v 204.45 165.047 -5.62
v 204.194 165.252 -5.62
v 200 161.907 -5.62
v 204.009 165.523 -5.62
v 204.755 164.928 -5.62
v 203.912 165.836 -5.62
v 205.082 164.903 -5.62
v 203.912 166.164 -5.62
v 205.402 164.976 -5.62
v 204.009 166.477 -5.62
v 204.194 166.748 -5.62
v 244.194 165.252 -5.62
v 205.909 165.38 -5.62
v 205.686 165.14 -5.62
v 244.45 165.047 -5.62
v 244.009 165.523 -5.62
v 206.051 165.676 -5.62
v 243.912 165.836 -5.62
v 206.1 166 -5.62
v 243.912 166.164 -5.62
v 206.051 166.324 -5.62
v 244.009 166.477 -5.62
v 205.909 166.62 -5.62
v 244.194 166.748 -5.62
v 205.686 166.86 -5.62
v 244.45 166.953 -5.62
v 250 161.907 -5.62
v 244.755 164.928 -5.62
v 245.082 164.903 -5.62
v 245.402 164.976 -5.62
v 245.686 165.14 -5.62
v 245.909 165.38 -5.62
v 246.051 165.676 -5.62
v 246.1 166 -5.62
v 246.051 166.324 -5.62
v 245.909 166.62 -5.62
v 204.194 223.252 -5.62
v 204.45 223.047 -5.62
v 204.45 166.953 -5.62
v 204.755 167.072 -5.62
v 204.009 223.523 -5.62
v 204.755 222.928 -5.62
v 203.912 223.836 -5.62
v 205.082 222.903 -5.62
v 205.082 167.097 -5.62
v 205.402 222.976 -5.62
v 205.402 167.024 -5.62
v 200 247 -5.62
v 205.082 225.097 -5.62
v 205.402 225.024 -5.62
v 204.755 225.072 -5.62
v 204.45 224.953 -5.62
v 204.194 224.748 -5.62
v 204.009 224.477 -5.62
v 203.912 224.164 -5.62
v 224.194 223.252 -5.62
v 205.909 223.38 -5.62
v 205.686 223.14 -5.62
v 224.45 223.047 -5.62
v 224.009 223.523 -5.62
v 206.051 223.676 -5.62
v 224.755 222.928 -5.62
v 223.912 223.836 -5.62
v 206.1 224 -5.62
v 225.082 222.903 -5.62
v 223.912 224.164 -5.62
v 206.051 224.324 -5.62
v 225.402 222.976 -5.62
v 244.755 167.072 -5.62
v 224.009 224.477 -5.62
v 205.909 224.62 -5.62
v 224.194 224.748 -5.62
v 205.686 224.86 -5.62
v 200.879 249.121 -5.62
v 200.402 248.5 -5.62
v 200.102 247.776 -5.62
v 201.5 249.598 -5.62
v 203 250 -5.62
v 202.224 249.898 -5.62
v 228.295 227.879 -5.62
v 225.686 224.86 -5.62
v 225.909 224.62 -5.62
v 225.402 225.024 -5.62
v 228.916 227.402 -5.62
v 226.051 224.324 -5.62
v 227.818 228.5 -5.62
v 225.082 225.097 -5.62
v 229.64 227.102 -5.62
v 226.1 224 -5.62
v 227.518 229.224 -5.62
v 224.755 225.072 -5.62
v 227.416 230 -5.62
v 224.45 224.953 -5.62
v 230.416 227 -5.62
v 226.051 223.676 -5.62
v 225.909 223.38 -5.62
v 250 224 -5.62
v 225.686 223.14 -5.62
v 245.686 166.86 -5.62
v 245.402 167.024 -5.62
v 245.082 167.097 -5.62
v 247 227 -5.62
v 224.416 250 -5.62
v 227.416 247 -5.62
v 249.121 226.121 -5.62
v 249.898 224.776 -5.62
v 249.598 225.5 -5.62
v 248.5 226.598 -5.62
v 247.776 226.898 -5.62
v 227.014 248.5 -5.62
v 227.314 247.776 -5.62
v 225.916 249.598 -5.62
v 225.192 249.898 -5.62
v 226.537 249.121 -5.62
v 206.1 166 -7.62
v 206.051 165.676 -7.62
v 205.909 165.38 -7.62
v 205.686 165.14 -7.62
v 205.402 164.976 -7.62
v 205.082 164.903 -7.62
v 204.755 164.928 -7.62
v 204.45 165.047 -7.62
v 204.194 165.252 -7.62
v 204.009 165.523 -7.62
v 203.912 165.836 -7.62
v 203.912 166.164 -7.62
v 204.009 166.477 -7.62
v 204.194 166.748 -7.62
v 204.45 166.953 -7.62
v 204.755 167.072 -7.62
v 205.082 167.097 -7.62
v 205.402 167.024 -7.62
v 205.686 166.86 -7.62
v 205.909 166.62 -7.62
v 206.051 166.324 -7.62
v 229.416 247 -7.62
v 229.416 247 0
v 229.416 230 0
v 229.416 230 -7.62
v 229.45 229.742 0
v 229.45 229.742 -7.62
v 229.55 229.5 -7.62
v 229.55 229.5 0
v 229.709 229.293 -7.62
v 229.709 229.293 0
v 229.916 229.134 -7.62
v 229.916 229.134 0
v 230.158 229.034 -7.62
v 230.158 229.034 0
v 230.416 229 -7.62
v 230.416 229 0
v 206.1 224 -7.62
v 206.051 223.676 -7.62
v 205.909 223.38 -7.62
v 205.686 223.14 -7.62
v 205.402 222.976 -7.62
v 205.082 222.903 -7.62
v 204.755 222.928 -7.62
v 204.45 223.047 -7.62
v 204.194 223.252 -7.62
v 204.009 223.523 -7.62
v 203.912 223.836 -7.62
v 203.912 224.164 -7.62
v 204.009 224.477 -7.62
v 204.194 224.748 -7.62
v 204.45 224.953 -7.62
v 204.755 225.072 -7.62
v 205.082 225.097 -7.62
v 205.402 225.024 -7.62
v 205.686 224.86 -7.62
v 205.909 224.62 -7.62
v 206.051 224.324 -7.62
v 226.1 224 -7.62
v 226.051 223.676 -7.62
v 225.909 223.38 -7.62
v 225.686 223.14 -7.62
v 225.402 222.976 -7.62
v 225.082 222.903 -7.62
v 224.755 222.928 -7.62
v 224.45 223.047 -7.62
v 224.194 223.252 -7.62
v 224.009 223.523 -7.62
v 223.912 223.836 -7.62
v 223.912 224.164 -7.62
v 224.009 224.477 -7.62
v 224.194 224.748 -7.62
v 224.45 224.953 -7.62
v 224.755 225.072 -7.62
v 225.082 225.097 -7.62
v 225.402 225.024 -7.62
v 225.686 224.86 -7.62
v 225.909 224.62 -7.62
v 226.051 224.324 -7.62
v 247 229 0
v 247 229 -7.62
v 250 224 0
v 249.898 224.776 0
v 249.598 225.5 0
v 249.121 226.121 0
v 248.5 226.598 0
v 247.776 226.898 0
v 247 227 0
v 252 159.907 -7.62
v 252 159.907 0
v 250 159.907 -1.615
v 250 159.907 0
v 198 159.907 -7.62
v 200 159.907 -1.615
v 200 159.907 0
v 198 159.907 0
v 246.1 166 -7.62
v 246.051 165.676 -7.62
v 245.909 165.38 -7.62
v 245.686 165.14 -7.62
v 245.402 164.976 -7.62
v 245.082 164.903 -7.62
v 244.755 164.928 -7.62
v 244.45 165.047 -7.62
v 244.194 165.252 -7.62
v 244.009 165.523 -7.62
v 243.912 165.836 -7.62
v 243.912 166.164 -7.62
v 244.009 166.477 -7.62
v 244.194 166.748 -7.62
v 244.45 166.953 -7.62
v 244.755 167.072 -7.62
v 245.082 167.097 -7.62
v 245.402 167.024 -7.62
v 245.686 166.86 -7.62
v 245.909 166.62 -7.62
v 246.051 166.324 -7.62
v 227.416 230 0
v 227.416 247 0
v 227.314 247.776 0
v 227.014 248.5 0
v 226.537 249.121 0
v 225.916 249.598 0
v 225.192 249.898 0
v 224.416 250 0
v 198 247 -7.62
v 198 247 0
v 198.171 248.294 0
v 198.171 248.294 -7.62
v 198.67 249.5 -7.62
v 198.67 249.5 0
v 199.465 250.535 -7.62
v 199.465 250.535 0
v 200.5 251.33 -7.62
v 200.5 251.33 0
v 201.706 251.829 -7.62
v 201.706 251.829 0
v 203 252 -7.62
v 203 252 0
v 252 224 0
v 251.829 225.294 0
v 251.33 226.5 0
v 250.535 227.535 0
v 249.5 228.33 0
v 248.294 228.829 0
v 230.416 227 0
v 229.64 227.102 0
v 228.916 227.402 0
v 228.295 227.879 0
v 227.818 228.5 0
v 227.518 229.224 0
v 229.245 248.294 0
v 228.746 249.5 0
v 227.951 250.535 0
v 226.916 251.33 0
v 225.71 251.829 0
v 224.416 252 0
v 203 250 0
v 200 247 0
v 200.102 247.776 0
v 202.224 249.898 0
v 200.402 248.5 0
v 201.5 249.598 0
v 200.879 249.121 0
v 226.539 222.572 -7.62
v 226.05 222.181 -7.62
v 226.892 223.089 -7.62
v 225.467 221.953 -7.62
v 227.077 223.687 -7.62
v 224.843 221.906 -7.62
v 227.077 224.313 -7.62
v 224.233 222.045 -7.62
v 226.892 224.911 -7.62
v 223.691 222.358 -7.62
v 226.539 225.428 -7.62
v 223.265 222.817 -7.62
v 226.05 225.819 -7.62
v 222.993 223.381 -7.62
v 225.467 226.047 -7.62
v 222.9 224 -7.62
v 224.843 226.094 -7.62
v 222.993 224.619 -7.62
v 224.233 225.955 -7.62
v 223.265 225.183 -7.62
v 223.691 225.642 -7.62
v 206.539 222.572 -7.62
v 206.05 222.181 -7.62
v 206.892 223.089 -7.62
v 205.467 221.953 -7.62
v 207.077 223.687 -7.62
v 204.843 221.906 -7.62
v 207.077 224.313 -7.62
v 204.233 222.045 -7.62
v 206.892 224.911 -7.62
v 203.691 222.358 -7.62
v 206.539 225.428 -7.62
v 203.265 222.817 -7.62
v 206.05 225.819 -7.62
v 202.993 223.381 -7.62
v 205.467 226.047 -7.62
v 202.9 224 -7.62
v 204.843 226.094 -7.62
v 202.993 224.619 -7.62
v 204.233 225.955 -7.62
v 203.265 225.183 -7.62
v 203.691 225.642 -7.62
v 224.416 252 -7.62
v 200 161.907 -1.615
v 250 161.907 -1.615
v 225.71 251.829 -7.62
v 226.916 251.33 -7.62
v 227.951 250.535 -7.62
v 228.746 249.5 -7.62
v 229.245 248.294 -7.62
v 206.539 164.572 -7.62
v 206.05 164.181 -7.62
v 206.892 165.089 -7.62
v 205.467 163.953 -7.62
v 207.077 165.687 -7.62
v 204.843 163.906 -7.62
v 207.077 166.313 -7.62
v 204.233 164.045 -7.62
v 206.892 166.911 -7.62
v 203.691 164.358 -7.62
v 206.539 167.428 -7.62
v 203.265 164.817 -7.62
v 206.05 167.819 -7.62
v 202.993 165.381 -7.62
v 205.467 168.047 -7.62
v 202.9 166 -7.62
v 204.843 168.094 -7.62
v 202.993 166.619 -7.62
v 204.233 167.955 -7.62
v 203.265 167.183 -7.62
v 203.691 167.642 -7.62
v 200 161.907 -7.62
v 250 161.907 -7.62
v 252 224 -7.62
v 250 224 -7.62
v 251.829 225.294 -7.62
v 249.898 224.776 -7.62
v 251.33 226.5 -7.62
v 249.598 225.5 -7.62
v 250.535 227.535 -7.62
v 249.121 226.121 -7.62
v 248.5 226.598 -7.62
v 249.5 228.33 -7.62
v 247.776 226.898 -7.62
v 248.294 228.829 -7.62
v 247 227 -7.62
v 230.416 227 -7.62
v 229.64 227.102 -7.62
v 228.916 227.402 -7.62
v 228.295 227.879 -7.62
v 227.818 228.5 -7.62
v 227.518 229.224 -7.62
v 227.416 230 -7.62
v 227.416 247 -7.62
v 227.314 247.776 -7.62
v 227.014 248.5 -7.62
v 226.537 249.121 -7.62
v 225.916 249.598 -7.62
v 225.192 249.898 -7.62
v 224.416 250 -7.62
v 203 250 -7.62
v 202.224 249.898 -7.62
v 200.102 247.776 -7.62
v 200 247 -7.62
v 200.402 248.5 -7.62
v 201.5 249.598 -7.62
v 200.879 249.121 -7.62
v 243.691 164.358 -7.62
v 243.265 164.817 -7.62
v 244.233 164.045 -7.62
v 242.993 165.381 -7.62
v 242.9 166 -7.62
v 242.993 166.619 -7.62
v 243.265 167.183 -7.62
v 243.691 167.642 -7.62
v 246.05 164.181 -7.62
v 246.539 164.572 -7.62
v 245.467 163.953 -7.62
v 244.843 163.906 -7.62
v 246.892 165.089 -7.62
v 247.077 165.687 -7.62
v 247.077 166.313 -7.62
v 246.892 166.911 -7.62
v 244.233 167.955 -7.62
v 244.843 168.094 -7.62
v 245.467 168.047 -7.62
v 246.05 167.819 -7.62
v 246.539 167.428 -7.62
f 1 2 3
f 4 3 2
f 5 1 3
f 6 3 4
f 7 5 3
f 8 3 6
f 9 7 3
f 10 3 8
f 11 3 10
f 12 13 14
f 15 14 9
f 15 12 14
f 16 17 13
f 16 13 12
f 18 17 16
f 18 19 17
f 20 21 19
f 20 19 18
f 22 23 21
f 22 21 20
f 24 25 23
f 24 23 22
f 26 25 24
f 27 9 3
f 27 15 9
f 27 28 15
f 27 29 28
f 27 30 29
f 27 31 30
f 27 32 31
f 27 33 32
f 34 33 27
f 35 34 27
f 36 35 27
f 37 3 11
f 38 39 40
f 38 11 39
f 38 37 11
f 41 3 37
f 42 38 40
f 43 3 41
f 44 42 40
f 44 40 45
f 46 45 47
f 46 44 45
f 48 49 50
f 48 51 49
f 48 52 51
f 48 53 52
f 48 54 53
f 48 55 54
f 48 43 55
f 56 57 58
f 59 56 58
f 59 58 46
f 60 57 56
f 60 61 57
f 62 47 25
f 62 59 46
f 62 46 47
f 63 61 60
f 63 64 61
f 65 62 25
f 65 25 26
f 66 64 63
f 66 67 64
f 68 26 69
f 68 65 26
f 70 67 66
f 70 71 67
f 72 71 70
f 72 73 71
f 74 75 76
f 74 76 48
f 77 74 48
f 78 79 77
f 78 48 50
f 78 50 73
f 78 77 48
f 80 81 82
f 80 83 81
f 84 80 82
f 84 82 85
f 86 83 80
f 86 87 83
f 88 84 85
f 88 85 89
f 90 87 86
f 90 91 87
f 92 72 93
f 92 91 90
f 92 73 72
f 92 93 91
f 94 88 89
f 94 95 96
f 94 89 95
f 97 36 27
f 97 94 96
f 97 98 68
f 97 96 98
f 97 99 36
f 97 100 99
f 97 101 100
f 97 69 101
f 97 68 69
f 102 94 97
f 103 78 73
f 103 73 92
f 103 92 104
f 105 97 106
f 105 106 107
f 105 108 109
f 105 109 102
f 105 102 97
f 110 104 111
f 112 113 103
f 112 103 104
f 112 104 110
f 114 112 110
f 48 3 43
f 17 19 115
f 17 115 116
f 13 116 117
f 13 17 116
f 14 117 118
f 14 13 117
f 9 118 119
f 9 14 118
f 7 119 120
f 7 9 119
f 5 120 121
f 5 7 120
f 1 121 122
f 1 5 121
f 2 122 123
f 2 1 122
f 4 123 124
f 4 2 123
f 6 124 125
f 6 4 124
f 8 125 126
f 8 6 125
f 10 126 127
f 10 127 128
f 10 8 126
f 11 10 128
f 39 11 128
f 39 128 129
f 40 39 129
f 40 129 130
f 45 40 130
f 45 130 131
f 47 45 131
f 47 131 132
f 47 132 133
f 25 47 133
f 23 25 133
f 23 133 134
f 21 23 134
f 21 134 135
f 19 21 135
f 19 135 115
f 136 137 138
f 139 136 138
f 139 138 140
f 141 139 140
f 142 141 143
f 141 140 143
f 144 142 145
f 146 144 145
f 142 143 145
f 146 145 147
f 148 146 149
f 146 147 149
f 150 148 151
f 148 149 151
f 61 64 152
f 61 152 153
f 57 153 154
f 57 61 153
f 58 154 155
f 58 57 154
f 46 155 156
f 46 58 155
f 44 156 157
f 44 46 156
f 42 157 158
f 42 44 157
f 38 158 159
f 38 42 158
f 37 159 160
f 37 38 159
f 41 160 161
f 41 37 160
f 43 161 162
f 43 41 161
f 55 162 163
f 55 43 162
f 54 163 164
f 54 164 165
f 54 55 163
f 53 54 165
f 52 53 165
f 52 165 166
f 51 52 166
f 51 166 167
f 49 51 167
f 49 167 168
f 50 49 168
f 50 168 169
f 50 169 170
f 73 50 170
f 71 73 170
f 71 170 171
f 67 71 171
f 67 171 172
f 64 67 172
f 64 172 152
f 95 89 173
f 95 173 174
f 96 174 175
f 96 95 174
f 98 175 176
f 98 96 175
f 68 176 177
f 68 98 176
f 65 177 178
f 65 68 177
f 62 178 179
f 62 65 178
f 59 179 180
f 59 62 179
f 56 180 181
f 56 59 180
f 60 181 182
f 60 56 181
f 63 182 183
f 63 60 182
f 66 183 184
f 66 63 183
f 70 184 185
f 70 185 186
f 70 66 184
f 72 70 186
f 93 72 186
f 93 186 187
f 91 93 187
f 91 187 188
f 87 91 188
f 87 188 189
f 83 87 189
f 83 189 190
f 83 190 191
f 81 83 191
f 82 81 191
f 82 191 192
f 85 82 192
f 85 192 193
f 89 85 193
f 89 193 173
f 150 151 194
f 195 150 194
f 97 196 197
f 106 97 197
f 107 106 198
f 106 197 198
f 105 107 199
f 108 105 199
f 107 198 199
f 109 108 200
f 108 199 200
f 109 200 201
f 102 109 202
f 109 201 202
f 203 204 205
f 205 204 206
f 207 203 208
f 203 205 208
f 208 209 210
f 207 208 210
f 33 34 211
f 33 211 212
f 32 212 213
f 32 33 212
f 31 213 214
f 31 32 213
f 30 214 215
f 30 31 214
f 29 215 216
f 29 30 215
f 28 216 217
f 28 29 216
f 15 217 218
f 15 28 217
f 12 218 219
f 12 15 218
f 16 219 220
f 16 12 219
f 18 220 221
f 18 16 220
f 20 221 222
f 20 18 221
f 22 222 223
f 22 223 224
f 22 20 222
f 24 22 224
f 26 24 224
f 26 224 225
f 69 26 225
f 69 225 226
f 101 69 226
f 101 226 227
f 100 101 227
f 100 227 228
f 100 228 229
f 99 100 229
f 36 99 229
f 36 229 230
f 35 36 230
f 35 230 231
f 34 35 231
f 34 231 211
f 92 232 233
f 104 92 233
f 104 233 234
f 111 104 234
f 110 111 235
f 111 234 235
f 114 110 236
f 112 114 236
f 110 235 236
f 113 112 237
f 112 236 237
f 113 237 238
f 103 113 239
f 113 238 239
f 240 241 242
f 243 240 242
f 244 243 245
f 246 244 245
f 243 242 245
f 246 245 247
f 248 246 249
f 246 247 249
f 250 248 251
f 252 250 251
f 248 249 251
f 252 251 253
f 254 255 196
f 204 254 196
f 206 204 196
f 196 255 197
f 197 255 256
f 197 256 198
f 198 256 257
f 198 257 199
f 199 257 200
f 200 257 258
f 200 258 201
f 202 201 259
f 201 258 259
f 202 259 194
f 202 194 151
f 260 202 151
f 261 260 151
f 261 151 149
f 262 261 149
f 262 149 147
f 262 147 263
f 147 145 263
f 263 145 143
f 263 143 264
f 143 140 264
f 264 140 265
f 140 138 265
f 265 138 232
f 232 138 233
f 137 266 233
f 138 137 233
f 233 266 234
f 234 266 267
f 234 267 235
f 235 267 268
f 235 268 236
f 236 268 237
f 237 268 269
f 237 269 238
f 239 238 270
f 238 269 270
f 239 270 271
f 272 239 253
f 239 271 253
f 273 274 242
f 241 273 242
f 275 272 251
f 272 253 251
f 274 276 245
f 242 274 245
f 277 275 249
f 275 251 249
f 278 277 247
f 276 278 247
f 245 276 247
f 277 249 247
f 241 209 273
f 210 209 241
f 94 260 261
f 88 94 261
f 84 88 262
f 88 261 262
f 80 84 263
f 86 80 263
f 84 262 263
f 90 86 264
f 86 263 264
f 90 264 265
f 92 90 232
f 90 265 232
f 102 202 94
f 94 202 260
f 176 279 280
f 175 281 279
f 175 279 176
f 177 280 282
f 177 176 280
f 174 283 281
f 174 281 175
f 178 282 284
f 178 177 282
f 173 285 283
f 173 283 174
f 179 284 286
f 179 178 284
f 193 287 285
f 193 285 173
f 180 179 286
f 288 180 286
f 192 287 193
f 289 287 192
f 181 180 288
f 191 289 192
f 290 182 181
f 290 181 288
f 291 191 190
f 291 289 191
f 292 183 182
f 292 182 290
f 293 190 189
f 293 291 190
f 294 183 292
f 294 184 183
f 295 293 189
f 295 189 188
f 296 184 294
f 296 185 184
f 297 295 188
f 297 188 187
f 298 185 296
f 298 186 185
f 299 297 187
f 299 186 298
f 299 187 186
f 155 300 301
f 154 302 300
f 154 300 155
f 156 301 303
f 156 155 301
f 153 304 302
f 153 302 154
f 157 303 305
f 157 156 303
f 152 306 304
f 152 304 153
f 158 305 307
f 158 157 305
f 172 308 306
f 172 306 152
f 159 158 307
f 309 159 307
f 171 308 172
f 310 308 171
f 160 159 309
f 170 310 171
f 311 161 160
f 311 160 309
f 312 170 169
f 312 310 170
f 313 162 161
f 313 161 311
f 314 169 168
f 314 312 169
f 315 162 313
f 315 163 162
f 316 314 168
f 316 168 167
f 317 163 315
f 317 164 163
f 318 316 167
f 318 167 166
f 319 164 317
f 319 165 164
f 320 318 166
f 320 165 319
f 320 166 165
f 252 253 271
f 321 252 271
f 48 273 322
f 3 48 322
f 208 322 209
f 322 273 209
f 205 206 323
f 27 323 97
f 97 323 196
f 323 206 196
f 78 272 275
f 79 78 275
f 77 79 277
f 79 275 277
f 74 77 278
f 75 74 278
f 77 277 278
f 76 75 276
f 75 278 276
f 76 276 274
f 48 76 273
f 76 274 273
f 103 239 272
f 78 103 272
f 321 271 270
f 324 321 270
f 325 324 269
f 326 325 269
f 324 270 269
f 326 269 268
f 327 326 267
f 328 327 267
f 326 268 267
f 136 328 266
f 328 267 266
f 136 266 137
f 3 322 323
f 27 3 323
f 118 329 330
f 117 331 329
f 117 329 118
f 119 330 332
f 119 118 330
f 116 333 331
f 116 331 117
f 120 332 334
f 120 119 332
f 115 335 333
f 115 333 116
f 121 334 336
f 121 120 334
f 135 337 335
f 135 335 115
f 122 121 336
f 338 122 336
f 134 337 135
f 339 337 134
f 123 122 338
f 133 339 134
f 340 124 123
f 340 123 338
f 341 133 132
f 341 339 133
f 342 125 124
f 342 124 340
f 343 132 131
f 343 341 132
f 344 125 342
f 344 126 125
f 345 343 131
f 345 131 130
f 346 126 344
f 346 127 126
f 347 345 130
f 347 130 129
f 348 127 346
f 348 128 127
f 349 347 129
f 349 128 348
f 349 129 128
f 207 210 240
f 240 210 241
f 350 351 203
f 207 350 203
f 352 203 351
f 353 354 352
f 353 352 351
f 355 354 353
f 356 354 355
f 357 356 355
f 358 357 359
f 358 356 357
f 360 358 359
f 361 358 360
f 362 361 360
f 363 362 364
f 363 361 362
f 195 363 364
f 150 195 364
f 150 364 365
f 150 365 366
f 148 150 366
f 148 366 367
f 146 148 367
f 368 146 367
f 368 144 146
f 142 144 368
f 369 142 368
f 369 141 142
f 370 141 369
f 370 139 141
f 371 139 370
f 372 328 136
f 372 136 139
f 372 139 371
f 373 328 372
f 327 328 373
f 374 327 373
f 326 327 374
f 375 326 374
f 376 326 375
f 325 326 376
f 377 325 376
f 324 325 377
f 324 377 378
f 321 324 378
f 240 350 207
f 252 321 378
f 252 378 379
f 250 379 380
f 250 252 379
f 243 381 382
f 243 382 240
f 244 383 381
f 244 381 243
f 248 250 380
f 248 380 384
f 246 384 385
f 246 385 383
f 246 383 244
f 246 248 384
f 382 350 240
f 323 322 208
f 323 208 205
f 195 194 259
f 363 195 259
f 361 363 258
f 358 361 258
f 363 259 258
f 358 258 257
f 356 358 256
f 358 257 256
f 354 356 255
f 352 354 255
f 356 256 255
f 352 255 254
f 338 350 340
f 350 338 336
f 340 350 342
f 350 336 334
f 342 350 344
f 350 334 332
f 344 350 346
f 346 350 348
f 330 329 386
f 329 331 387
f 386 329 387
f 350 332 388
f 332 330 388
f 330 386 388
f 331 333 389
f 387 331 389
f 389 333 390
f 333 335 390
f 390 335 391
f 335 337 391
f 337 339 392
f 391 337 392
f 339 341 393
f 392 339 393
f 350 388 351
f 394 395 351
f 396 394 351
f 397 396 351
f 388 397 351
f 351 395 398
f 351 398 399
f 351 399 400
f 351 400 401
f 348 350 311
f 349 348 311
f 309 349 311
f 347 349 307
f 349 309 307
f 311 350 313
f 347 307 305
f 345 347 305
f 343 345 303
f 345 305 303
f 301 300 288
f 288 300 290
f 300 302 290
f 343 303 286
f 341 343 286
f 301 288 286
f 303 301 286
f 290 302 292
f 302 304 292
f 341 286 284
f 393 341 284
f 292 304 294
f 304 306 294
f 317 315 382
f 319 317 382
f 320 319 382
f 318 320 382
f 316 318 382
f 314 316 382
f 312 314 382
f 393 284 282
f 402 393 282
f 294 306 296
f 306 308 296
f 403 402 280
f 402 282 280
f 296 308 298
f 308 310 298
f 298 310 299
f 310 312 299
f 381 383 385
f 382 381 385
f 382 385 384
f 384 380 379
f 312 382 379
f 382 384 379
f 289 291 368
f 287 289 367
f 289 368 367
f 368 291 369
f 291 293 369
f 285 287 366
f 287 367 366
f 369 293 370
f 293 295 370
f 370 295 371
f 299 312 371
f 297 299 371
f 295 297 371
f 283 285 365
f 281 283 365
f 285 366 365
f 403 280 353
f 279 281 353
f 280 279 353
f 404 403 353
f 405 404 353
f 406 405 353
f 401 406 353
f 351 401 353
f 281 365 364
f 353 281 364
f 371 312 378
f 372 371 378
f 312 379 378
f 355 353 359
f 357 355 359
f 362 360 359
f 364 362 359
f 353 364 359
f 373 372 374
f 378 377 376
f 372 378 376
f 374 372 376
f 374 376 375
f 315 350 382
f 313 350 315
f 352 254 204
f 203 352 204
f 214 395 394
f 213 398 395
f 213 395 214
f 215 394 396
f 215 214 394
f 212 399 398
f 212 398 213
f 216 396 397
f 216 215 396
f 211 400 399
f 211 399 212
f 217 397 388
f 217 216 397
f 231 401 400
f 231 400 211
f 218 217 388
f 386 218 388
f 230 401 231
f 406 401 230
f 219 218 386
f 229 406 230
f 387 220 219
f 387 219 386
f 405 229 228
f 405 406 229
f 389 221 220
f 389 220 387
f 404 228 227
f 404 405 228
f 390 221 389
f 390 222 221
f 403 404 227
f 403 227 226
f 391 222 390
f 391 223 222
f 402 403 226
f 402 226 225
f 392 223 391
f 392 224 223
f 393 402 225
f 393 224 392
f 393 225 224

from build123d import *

# Parameters (mm, degrees)
BOSS_EXTRUDE1_DEPTH = 7.62
BOSS_EXTRUDE2_DEPTH = 6.004598
SKETCH12_R          = 2.1
SKETCH12_R_2        = 1.1
BOSS_EXTRUDE5_DEPTH = 6.0045981
SKETCH13_R          = 1.1
CUT_EXTRUDE5_DEPTH  = 6.0045981
SKETCH11_W          = 50
SKETCH11_H          = 1.6154019
CUT_EXTRUDE6_DEPTH  = 2
CUT_EXTRUDE7_DEPTH  = 4.0045981


with BuildPart() as part:
    # Sketch3 → Boss-Extrude1 (new body)
    with BuildSketch(Plane.XY):
        with BuildLine():
            Line((251.999999934, 224.000364601), (252, 159.907096774))
            Line((252, 159.907096774), (198, 159.907096774))
            Line((198, 159.907096774), (198.000000066, 247.000364601))
            ThreePointArc((198.000000066, 247.000364601), (199.464786475, 250.535213525), (202.999635399, 251.999999934))
            Line((202.999635399, 251.999999934), (224.416364601, 251.999999934))
            ThreePointArc((224.416364601, 251.999999934), (227.951213525, 250.535213525), (229.415999934, 247.000364601))
            Line((229.415999934, 247.000364601), (229.415999934, 230.000364601))
            ThreePointArc((229.415999934, 230.000364601), (229.709213468, 229.293213468), (230.416364601, 228.999999934))
            Line((230.416364601, 228.999999934), (247.000364601, 228.999999934))
            ThreePointArc((247.000364601, 228.999999934), (250.535213525, 227.535213525), (251.999999934, 224.000364601))
        make_face()
        with BuildLine():
            Line((200, 161.907096774), (250, 161.907096774))
            Line((250, 161.907096774), (250, 224))
            ThreePointArc((250, 224), (249.121, 226.121), (247, 227))
            Line((247, 227), (230.416, 227))
            ThreePointArc((230.416, 227), (228.295, 227.879), (227.416, 230))
            Line((227.416, 230), (227.416, 247))
            ThreePointArc((227.416, 247), (226.537, 249.121), (224.416, 250))
            Line((224.416, 250), (203, 250))
            ThreePointArc((203, 250), (200.879, 249.121), (200, 247))
            Line((200, 247), (200, 161.907096774))
        make_face(mode=Mode.SUBTRACT)
    extrude(amount=-BOSS_EXTRUDE1_DEPTH)



with BuildPart() as body_2:
    # Sketch5 → Boss-Extrude2 (new body)
    with BuildSketch(Plane(origin=(0, 0, -1.6154019), x_dir=(-1, 0, 0), z_dir=(0, 0, -1))):
        with BuildLine():
            Line((-200, 161.907096774), (-250, 161.907096774))
            Line((-250, 161.907096774), (-250, 224))
            ThreePointArc((-250, 224), (-249.121, 226.121), (-247, 227))
            Line((-247, 227), (-230.416, 227))
            ThreePointArc((-230.416, 227), (-228.295, 227.879), (-227.416, 230))
            Line((-227.416, 230), (-227.416, 247))
            ThreePointArc((-227.416, 247), (-226.537, 249.121), (-224.416, 250))
            Line((-224.416, 250), (-203, 250))
            ThreePointArc((-203, 250), (-200.879, 249.121), (-200, 247))
            Line((-200, 247), (-200, 161.907096774))
        make_face()
    extrude(amount=BOSS_EXTRUDE2_DEPTH)


with BuildPart() as part_1:
    add(part.part)

    add(body_2.part)  # Boss-Extrude5 merges body 2
    # Sketch12 → Boss-Extrude5 (add)
    # profile 1 of 4: a face of its own
    with BuildSketch(Plane(origin=(0, 0, -1.6154019), x_dir=(-1, 0, 0), z_dir=(0, 0, -1))):
        with Locations((-245, 166)):
            Circle(SKETCH12_R)
        with Locations((-245, 166)):
            Circle(SKETCH12_R_2, mode=Mode.SUBTRACT)
    # profile 2 of 4: a face of its own
    with BuildSketch(Plane(origin=(0, 0, -1.6154019), x_dir=(-1, 0, 0), z_dir=(0, 0, -1))):
        with Locations((-205, 166)):
            Circle(SKETCH12_R)
        with Locations((-205, 166)):
            Circle(SKETCH12_R_2, mode=Mode.SUBTRACT)
    # profile 3 of 4: a face of its own
    with BuildSketch(Plane(origin=(0, 0, -1.6154019), x_dir=(-1, 0, 0), z_dir=(0, 0, -1))):
        with Locations((-225, 224)):
            Circle(SKETCH12_R)
        with Locations((-225, 224)):
            Circle(SKETCH12_R_2, mode=Mode.SUBTRACT)
    # profile 4 of 4: a face of its own
    with BuildSketch(Plane(origin=(0, 0, -1.6154019), x_dir=(-1, 0, 0), z_dir=(0, 0, -1))):
        with Locations((-205, 224)):
            Circle(SKETCH12_R)
        with Locations((-205, 224)):
            Circle(SKETCH12_R_2, mode=Mode.SUBTRACT)
    extrude(amount=BOSS_EXTRUDE5_DEPTH)

    # Sketch13 → Cut-Extrude5 (cut)
    with BuildSketch(Plane(origin=(0, 0, -1.6154019), x_dir=(-1, 0, 0), z_dir=(0, 0, -1))):
        with Locations(Location((-225, 224, 0), (0, 0, 180))):
            Circle(SKETCH13_R)
        with Locations(Location((-205, 224, 0), (0, 0, 180))):
            Circle(SKETCH13_R)
        with Locations(Location((-205, 166, 0), (0, 0, 180))):
            Circle(SKETCH13_R)
        with Locations(Location((-245, 166, 0), (0, 0, 180))):
            Circle(SKETCH13_R)
    extrude(amount=CUT_EXTRUDE5_DEPTH, mode=Mode.SUBTRACT)

    # Sketch11 → Cut-Extrude6 (cut)
    with BuildSketch(Plane.XZ.offset(-159.907096774)):
        with Locations((225, -0.80770095)):
            Rectangle(SKETCH11_W, SKETCH11_H)
    extrude(amount=-CUT_EXTRUDE6_DEPTH, mode=Mode.SUBTRACT)

    # Sketch9 → Cut-Extrude7 (cut)
    with BuildSketch(Plane.XY.offset(-1.6154019)):
        with BuildLine():
            Line((200, 161.907096774), (250, 161.907096774))
            Line((250, 161.907096774), (250, 224))
            ThreePointArc((250, 224), (249.121, 226.121), (247, 227))
            Line((247, 227), (230.416, 227))
            ThreePointArc((230.416, 227), (228.295, 227.879), (227.416, 230))
            Line((227.416, 230), (227.416, 247))
            ThreePointArc((227.416, 247), (226.537, 249.121), (224.416, 250))
            Line((224.416, 250), (203, 250))
            ThreePointArc((203, 250), (200.879, 249.121), (200, 247))
            Line((200, 247), (200, 161.907096774))
        make_face()
    extrude(amount=-CUT_EXTRUDE7_DEPTH, mode=Mode.SUBTRACT)


solid = part_1.part
